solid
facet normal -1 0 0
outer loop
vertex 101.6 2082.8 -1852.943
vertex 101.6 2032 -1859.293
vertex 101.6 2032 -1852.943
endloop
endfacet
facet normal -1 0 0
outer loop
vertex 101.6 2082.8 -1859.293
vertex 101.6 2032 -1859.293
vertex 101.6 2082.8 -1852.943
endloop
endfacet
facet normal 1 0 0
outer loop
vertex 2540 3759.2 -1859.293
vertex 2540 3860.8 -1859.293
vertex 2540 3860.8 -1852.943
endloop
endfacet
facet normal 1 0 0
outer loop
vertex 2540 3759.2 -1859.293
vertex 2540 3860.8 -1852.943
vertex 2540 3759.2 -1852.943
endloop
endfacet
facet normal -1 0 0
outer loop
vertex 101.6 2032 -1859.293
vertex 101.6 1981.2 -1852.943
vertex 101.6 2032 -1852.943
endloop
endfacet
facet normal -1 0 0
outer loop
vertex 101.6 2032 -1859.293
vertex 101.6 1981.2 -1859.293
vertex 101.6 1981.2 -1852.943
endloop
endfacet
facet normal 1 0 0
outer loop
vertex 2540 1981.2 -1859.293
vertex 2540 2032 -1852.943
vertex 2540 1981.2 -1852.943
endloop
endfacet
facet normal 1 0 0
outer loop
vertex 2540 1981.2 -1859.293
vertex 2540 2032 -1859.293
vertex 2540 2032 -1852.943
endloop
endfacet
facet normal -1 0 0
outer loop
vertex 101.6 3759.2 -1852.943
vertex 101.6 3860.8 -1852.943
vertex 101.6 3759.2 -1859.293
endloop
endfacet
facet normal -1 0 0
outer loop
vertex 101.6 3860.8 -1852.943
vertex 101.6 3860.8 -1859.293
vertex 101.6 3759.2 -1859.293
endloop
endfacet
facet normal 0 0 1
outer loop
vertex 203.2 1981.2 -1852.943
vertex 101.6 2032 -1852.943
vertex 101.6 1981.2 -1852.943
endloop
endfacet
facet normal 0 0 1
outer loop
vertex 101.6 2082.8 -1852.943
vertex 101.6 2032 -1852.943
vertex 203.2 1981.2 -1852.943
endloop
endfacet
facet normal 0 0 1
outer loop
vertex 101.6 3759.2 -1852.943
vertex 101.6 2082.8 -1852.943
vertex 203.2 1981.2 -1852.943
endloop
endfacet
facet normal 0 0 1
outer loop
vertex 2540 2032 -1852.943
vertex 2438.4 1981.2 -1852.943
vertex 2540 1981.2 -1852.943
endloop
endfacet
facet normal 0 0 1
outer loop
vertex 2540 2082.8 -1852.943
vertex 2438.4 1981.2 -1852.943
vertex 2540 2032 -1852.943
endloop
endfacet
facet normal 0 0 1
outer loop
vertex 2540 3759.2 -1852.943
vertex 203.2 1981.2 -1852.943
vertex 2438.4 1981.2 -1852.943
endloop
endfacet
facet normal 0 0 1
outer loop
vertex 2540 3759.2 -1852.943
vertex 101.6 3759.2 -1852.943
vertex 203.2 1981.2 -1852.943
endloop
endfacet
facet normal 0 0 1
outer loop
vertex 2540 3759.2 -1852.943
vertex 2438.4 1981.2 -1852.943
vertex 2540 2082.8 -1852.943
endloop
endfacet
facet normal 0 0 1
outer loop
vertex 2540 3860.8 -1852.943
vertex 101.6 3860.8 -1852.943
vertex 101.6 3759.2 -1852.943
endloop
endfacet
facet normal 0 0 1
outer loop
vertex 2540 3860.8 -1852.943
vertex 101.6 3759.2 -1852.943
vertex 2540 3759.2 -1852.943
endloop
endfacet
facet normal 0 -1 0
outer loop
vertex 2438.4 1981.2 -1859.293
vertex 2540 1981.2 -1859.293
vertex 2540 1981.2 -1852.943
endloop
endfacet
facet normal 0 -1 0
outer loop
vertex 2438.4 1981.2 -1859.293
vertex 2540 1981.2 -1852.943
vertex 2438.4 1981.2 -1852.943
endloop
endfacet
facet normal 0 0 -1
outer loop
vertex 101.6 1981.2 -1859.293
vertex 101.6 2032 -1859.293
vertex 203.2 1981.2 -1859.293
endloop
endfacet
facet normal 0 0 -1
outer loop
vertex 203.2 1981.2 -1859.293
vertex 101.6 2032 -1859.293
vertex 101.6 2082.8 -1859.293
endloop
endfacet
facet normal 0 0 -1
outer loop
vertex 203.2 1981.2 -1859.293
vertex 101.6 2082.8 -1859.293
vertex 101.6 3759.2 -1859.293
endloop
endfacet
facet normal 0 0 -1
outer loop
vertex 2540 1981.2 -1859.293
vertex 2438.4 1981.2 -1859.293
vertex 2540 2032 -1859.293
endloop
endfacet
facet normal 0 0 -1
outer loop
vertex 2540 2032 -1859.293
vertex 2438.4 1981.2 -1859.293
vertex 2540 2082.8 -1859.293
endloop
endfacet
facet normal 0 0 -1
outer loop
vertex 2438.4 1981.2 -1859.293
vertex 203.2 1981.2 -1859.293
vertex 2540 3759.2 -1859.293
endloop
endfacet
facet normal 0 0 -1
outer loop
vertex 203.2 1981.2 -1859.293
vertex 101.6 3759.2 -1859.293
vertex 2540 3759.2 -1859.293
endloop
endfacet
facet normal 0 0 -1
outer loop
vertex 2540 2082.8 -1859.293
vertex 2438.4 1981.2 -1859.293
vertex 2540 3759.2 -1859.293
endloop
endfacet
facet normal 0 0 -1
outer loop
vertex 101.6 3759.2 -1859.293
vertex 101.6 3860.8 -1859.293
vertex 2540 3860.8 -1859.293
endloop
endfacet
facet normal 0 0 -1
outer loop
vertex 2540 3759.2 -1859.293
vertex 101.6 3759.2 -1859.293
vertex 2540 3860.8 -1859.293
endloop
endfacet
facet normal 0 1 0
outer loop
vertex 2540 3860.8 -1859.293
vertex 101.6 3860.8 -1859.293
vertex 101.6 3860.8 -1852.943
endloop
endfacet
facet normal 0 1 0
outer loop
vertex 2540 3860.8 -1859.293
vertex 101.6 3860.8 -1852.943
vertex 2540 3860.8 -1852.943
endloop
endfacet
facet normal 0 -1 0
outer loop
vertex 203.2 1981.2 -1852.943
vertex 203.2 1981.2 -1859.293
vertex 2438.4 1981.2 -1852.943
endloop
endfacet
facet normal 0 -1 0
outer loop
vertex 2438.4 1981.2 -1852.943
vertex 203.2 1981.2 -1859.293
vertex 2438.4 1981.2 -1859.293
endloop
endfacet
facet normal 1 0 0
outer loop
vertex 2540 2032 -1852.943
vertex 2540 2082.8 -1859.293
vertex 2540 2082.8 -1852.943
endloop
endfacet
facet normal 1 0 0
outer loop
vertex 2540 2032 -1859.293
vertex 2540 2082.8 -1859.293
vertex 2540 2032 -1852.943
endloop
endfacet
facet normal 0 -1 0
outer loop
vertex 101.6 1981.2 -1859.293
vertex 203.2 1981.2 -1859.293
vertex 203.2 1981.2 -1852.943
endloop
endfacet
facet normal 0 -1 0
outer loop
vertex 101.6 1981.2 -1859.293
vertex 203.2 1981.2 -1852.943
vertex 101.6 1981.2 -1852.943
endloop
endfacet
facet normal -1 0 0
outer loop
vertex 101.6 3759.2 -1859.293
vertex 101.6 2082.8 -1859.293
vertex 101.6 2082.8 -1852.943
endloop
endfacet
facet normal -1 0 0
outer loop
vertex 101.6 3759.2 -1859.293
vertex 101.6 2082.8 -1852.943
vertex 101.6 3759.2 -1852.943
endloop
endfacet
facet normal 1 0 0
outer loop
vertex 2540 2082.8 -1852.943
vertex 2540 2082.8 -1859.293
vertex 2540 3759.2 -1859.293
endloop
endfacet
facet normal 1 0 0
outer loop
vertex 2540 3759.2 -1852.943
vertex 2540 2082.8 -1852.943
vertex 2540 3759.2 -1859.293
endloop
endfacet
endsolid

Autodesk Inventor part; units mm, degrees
ref_plane "YZ Plane" through (0, 0, 0) normal (1, 0, 0) x (0, 1, 0)
ref_plane "XZ Plane" through (0, 0, 0) normal (0, 1, 0) x (-1, 0, 0)
ref_plane "XY Plane" through (0, 0, 0) normal (0, 0, 1) x (1, 0, 0)
ref_plane "Work Plane1" through (0, 2032, -1859.2927) normal (0, 0, 1) x (1, 0, 0)
sketch "Sketch1" plane through (0, 2032, -1859.2927) normal (0, 0, 1) x (1, 0, 0)
  line L0 (203.2, -50.8) -> (2438.4, -50.8) projected
  line L1 (203.2, -50.8) -> (101.6, -50.8) projected
  line L2 (101.6, -50.8) -> (101.6, 0) projected
  line L3 (101.6, 0) -> (101.6, 50.8) projected
  line L4 (101.6, 50.8) -> (101.6, 1727.2) projected
  line L5 (101.6, 1828.8) -> (101.6, 1727.2) projected
  line L6 (101.6, 1828.8) -> (2540, 1828.8) projected
  line L7 (2540, 1828.8) -> (2540, 1727.2) projected
  line L8 (2540, 50.8) -> (2540, 1727.2) projected
  line L9 (2540, 50.8) -> (2540, 0) projected
  line L10 (2540, 0) -> (2540, -50.8) projected
  line L11 (2540, -50.8) -> (2438.4, -50.8) projected
  point P0 (0, -2032)
  point P1 (101.6, 1727.2)
  point P2 (101.6, 50.8)
extrude "Extrusion1" add sketch "Sketch1" along normal blind 6.35
properties part number "paperbodyfront"
